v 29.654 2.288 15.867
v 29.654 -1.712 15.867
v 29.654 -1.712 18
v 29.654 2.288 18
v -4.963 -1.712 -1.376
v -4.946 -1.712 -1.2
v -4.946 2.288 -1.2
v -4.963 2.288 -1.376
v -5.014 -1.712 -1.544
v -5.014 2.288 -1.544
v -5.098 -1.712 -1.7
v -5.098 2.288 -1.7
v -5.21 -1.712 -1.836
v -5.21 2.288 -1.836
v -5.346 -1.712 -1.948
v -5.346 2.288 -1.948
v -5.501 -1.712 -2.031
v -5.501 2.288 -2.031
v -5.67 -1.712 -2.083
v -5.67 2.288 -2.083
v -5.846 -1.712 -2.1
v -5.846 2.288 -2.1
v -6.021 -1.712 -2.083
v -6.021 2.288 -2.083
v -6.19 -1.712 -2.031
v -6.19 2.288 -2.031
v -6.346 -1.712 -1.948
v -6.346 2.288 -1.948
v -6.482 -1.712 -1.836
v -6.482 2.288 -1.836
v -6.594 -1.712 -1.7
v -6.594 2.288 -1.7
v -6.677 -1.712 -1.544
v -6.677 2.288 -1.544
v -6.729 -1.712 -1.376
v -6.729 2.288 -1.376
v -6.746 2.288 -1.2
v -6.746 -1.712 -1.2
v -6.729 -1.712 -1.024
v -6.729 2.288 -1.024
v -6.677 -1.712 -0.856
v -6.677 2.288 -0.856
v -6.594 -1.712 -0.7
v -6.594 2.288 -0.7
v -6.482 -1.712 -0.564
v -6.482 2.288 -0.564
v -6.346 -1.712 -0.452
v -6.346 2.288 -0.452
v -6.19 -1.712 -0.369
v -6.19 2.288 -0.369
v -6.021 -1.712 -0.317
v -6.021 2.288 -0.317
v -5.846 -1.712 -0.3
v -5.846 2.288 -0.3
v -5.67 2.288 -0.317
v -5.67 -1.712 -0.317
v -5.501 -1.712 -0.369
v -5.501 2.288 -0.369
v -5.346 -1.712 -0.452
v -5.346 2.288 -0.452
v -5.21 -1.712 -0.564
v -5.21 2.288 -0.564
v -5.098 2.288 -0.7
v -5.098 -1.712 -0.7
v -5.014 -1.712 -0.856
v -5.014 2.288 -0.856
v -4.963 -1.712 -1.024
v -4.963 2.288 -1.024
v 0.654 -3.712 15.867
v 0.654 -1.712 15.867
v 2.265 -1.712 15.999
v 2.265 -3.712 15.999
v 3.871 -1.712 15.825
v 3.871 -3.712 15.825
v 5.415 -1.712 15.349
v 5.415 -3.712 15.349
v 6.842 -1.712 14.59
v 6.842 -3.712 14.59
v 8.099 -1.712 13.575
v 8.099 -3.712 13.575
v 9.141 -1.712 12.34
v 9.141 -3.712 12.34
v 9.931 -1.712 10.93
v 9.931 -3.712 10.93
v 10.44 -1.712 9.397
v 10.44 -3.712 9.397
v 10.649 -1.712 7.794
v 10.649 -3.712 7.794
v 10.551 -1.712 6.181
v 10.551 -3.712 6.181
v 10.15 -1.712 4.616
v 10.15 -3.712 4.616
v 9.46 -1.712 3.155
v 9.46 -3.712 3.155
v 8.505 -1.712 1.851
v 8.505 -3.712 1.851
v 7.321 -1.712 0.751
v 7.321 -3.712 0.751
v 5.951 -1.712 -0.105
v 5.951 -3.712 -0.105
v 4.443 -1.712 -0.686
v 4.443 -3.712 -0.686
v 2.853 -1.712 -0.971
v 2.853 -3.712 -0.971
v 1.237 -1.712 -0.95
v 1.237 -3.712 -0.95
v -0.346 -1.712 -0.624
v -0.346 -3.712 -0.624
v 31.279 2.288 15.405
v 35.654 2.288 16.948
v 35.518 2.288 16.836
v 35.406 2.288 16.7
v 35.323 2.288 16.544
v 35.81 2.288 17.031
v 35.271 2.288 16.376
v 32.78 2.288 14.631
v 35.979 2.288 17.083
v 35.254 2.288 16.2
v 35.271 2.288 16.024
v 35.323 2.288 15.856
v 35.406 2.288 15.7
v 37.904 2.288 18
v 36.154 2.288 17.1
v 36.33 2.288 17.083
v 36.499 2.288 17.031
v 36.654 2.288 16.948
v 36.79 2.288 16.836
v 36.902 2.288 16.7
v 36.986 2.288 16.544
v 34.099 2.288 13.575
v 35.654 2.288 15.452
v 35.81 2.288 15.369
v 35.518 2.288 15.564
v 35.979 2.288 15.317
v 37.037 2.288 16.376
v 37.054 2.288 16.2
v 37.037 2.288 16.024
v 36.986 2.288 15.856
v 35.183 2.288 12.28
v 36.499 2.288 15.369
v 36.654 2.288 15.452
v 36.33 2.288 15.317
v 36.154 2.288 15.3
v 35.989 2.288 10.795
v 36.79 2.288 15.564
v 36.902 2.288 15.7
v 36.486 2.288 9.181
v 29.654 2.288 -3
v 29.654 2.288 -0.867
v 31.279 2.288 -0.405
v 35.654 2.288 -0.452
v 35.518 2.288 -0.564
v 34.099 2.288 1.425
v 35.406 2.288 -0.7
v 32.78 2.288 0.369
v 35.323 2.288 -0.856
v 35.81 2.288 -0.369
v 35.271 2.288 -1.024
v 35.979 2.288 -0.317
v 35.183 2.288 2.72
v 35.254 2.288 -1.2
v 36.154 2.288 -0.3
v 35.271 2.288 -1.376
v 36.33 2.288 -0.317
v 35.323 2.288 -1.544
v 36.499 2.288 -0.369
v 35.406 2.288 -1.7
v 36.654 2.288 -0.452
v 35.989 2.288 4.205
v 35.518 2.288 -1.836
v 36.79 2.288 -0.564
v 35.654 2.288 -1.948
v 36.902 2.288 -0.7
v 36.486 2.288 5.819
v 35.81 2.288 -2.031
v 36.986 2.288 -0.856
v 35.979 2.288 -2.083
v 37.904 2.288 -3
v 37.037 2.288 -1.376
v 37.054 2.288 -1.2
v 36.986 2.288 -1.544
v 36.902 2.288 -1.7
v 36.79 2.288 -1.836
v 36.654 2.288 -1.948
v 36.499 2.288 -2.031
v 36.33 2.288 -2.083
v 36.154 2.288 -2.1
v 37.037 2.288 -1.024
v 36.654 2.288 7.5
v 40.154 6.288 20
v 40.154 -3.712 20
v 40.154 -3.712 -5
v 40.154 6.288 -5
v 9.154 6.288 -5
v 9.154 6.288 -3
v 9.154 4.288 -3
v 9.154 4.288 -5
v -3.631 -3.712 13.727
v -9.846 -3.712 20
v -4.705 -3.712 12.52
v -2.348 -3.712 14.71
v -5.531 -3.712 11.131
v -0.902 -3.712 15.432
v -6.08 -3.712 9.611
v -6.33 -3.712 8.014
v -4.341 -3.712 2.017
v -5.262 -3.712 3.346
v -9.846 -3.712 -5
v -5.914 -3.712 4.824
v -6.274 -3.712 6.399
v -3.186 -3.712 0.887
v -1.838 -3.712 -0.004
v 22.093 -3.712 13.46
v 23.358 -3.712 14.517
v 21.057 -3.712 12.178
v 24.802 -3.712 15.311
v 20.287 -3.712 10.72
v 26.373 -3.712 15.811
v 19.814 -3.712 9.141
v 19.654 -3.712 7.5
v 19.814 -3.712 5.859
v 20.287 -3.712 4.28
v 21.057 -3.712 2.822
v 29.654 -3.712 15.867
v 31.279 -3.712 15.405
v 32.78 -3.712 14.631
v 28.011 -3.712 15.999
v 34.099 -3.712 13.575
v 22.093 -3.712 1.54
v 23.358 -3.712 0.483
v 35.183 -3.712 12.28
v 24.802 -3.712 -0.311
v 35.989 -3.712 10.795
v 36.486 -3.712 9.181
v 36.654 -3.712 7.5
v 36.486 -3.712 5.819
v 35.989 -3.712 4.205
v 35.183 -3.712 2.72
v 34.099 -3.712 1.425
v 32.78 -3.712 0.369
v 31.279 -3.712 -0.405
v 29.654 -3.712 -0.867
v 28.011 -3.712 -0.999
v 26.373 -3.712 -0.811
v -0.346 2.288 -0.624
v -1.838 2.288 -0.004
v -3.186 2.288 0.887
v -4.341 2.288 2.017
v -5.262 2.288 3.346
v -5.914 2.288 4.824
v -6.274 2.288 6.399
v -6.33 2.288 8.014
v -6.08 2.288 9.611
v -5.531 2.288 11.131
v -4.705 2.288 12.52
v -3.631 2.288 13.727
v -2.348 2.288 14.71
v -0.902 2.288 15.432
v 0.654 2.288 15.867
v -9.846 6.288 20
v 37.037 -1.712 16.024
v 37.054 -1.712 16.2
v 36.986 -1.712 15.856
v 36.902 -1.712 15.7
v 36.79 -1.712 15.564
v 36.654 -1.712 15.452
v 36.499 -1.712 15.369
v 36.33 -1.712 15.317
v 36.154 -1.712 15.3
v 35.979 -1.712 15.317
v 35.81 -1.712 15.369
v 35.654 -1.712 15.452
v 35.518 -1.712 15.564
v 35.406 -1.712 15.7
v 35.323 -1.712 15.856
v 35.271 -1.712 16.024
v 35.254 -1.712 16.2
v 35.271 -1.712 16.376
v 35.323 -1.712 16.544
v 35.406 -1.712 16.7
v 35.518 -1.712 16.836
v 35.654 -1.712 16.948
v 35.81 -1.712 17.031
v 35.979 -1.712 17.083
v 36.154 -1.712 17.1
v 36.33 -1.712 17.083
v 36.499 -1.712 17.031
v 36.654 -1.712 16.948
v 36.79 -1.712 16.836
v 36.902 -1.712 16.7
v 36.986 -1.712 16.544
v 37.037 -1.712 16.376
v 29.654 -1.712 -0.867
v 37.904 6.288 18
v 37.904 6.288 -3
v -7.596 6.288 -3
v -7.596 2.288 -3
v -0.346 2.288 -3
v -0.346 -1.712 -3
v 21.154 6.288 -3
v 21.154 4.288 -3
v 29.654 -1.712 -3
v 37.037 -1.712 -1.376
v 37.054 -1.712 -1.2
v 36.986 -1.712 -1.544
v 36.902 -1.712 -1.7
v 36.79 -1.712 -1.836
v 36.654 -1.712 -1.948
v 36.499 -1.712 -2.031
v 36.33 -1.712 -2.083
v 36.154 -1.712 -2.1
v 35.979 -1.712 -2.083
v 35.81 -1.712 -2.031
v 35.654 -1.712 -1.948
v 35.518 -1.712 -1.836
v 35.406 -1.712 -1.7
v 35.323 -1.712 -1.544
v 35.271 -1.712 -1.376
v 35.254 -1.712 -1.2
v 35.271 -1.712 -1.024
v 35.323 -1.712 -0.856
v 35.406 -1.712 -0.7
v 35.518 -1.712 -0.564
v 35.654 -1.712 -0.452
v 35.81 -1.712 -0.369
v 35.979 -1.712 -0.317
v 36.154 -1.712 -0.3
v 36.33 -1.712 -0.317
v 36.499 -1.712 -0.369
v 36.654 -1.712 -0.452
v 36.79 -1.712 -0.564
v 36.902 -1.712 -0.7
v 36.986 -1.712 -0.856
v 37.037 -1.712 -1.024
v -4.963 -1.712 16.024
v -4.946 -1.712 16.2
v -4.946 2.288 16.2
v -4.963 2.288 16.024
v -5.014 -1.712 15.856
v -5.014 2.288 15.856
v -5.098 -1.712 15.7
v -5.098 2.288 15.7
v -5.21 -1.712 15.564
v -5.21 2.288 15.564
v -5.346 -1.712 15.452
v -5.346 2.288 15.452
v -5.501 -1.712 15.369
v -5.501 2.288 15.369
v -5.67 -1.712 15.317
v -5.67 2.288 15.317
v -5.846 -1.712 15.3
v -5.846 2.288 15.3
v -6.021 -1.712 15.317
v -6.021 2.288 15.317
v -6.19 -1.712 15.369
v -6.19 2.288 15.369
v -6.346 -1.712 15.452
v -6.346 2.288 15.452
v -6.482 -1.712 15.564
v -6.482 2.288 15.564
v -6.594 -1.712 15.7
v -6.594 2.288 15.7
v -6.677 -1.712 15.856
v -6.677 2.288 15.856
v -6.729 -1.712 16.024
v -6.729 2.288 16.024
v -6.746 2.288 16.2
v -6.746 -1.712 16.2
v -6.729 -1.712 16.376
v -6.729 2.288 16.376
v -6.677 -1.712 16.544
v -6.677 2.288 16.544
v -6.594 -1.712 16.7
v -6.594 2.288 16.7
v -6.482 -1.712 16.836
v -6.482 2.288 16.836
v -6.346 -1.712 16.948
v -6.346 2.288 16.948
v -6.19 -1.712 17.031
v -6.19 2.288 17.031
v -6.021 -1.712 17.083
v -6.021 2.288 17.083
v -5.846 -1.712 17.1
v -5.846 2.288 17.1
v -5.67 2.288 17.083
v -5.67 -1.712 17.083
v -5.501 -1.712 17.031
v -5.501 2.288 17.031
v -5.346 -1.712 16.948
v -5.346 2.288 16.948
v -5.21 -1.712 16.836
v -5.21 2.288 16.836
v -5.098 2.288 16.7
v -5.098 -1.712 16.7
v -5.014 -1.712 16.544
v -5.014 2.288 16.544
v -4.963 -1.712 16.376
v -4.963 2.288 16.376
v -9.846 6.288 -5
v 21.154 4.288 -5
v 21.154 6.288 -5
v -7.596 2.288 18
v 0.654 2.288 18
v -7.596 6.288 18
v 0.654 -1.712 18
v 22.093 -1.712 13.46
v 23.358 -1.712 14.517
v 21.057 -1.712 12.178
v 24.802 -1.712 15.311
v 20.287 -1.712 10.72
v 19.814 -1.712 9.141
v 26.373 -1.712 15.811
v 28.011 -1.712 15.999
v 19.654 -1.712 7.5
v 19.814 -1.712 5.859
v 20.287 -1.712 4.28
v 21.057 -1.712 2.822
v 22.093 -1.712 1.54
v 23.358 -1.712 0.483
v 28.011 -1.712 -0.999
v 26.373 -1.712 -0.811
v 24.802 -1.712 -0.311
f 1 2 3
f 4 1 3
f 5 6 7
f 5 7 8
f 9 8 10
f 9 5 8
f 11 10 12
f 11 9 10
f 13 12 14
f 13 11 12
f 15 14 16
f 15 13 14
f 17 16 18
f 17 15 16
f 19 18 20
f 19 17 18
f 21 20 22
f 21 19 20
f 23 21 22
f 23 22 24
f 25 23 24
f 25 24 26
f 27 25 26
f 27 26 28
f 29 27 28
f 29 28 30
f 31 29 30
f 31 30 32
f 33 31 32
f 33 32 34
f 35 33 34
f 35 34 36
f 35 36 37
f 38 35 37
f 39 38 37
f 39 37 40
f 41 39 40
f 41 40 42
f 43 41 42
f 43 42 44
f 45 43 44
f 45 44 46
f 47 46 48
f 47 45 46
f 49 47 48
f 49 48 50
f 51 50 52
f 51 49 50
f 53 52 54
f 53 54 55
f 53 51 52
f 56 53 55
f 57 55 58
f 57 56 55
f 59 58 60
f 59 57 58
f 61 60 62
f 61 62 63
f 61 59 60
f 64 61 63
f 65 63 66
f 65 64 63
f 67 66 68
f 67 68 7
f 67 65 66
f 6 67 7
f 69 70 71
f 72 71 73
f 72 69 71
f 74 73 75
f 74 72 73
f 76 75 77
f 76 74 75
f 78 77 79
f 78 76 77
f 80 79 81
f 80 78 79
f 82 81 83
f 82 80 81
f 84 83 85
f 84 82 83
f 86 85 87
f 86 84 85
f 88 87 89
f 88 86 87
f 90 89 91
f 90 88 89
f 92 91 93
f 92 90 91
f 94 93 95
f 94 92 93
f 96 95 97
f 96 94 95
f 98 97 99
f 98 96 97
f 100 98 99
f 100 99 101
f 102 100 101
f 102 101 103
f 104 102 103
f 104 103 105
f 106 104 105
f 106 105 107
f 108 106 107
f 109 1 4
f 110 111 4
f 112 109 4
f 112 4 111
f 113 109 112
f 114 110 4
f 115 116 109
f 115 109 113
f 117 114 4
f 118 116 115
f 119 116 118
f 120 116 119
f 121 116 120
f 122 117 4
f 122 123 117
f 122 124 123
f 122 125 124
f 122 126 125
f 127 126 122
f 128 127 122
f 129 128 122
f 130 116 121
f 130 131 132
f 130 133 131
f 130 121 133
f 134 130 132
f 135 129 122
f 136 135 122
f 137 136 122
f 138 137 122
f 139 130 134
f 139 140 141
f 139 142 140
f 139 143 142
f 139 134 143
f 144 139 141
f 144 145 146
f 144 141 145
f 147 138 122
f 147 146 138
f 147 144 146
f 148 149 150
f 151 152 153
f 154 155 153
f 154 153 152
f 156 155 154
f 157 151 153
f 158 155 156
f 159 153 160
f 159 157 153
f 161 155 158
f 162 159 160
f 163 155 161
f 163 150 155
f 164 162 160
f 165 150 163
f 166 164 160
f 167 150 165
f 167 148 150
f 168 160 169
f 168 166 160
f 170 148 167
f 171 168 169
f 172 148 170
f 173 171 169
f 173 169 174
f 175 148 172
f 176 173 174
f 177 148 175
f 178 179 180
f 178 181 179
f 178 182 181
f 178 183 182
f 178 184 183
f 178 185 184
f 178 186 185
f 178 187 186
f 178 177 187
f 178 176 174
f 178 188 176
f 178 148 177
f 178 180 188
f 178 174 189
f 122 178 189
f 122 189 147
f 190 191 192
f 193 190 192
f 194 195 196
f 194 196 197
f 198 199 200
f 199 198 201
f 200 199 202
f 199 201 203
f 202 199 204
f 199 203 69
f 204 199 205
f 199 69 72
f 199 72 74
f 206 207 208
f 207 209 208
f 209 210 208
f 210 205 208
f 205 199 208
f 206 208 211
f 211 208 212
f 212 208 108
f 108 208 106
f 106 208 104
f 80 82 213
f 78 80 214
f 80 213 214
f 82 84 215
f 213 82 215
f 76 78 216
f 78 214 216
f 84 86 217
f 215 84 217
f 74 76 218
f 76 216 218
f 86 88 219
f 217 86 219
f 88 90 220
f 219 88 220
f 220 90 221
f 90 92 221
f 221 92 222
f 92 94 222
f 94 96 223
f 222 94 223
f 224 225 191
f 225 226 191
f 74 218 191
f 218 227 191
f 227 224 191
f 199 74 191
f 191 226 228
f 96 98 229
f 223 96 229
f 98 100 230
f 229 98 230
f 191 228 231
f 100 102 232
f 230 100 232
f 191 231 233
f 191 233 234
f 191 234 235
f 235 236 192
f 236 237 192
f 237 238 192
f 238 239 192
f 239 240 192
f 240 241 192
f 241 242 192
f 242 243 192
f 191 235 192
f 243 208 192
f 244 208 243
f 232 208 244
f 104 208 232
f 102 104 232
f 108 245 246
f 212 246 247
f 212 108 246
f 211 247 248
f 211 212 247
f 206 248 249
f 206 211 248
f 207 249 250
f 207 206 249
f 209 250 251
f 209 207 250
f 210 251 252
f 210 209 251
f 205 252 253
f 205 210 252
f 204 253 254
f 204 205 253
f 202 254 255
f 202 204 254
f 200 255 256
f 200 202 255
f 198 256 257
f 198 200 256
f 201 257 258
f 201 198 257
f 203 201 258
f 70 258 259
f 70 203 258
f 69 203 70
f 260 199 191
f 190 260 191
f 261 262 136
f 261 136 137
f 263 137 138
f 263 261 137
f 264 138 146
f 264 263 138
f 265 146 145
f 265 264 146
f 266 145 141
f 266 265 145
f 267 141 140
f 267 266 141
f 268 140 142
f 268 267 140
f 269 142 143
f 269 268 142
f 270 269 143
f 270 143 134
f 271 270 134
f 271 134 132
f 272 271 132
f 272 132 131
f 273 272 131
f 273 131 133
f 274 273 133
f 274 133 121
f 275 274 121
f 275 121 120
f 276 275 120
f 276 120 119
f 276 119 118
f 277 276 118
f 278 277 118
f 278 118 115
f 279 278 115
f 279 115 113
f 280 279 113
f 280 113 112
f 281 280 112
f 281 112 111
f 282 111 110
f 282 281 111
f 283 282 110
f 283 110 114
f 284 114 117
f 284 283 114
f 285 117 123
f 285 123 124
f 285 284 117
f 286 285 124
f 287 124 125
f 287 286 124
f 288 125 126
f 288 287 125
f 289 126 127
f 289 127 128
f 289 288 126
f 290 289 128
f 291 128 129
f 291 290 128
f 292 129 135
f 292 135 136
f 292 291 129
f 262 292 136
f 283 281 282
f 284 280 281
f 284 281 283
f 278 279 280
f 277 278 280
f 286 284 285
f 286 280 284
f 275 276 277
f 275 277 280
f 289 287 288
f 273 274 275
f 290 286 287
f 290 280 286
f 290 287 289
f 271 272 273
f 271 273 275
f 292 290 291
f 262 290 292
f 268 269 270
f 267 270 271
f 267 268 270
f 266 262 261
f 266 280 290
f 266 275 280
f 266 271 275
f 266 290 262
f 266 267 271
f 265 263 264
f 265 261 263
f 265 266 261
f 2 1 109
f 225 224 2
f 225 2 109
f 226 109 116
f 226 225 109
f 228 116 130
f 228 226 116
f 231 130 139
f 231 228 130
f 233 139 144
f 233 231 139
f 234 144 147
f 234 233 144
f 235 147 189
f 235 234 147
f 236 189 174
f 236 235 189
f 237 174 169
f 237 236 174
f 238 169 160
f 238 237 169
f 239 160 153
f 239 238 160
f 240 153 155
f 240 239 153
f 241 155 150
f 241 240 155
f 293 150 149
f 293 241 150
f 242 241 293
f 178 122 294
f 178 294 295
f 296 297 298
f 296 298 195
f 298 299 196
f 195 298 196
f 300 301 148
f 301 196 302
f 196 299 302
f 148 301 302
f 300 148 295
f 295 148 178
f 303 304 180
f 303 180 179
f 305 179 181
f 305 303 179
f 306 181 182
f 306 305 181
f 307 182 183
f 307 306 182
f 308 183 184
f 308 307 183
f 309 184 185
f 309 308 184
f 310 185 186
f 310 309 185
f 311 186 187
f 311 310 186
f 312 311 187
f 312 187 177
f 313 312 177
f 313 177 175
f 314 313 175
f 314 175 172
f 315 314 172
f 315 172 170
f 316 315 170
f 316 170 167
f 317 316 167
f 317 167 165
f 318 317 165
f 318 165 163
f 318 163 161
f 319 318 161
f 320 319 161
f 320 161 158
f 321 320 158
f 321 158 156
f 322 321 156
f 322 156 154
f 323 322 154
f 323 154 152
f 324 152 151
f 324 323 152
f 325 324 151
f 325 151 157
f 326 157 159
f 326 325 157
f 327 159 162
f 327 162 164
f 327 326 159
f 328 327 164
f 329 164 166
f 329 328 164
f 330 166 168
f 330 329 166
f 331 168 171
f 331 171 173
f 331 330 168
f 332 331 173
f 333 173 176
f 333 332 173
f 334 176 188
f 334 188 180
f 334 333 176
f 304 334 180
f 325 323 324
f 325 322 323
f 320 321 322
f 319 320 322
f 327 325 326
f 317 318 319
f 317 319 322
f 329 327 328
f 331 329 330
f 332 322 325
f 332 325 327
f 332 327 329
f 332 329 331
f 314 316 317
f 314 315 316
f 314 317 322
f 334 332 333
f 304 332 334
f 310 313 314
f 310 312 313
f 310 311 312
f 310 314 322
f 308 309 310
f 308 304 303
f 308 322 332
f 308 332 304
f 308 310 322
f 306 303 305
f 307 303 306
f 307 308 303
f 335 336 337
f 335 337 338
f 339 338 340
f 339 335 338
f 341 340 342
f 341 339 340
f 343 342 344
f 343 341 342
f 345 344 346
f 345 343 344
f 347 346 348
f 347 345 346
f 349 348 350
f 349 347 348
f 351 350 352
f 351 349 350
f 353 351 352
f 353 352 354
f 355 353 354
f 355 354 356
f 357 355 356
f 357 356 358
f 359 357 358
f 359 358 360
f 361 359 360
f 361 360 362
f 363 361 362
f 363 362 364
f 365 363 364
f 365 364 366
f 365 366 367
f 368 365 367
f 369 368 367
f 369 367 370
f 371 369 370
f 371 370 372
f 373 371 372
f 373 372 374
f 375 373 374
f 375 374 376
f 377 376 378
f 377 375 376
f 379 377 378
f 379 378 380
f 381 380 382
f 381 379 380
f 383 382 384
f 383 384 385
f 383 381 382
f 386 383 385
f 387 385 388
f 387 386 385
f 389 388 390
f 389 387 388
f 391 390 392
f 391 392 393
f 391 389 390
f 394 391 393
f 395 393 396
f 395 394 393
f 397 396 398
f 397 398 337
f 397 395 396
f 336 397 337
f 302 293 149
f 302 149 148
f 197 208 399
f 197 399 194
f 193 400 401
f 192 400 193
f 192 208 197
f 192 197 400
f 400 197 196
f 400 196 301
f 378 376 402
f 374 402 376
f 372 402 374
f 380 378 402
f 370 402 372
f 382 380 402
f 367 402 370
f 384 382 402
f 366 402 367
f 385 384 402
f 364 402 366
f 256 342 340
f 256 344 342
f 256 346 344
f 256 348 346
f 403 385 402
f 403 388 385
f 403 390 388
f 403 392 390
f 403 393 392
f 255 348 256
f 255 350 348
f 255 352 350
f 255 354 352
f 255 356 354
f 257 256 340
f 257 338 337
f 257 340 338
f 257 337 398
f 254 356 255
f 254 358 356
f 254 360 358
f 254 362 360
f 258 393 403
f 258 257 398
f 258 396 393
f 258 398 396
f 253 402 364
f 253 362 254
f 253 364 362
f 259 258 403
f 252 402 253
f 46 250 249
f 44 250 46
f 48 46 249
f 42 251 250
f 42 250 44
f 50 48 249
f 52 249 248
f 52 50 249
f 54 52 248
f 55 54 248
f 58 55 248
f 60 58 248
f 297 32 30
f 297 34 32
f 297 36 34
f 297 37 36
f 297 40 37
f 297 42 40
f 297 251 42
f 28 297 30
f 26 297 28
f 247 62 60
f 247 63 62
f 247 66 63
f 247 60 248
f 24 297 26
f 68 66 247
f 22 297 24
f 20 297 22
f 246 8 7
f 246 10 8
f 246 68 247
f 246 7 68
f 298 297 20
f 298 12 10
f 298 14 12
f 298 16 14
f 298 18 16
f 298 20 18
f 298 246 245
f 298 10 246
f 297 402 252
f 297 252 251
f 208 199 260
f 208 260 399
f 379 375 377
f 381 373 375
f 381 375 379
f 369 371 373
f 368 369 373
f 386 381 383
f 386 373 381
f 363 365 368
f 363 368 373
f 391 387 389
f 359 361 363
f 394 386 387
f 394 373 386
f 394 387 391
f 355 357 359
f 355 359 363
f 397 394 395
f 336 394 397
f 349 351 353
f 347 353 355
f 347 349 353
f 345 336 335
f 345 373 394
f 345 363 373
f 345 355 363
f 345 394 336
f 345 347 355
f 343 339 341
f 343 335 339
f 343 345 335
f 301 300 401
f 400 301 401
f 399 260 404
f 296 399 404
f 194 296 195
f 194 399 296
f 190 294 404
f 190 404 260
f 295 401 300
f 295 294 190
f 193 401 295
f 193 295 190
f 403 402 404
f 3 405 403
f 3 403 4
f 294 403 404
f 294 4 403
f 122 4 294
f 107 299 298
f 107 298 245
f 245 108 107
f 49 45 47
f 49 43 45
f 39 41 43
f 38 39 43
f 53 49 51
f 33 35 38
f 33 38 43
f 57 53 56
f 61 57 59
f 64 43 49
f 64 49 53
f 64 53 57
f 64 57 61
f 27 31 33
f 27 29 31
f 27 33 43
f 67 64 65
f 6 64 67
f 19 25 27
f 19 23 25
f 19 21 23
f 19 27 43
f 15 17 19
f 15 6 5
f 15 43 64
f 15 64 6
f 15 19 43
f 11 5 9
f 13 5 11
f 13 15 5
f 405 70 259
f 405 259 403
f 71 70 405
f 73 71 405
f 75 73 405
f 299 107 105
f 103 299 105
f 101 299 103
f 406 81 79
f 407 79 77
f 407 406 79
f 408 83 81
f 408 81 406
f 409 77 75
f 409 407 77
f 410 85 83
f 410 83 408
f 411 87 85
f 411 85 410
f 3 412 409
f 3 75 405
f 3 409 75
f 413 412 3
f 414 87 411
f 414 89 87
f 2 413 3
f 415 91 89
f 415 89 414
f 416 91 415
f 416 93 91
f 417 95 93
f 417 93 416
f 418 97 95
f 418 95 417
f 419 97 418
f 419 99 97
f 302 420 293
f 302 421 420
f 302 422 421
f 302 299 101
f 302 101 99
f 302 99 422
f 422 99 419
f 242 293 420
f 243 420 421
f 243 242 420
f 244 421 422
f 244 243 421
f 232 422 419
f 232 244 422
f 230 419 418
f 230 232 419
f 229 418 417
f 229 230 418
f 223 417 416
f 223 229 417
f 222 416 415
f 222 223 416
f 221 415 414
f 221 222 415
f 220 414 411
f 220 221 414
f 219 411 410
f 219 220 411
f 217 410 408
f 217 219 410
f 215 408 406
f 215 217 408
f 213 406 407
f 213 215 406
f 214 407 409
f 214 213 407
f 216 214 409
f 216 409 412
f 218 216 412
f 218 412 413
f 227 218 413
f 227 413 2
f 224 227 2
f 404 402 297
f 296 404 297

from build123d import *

# Parameters (mm, degrees)
SKETCH004_W   = 50
SKETCH004_H   = 25
SKETCH004_W_2 = 45.5
SKETCH004_H_2 = 21
PAD001_DEPTH  = 10
SKETCH003_R   = 0.9
PAD002_DEPTH  = 6
SKETCH005_W   = 50
SKETCH005_H   = 25
SKETCH005_R   = 8.5
PAD003_DEPTH  = 2
SKETCH006_W   = 12
SKETCH006_H   = 2
POCKET_DEPTH  = 2


with BuildPart() as part:
    # Sketch004 (on DatumPlane) → Pad001 (new body)
    with BuildSketch(Plane(origin=(-8.845912, -3.712389, 7.5), x_dir=(1, 0, 0), z_dir=(0, 1, 0))):
        Rectangle(SKETCH004_W, SKETCH004_H)
        Rectangle(SKETCH004_W_2, SKETCH004_H_2, mode=Mode.SUBTRACT)
    extrude(amount=PAD001_DEPTH)

    # Sketch003 (on DatumPlane) → Pad002 (join)
    with BuildSketch(Plane(origin=(-8.845912, -3.712389, 7.5), x_dir=(1, 0, 0), z_dir=(0, 1, 0))):
        with BuildLine():
            Line((-23.5, -10.75), (-14.5, -10.75))
            Line((-14.5, -8.3666), (-14.5, -10.75))
            ThreePointArc((-15.5, 8.124038), (-21.484415, -0.514499), (-14.5, -8.3666))
            Line((-15.5, 10.75), (-15.5, 8.124038))
            Line((-15.5, 10.75), (-23.5, 10.75))
            Line((-23.5, 10.75), (-23.5, -10.75))
        make_face()
        with Locations((-21, 8.7)):
            Circle(SKETCH003_R, mode=Mode.SUBTRACT)
        with Locations((-21, -8.7)):
            Circle(SKETCH003_R, mode=Mode.SUBTRACT)
        with BuildLine():
            Line((23.5, -10.75), (23.5, 10.75))
            Line((23.5, 10.75), (14.5, 10.75))
            Line((14.5, 8.3666), (14.5, 10.75))
            ThreePointArc((14.5, -8.3666), (21.5, 0), (14.5, 8.3666))
            Line((14.5, -8.3666), (14.5, -10.75))
            Line((14.5, -10.75), (23.5, -10.75))
        make_face()
        with Locations((21, -8.7)):
            Circle(SKETCH003_R, mode=Mode.SUBTRACT)
        with Locations((21, 8.7)):
            Circle(SKETCH003_R, mode=Mode.SUBTRACT)
    extrude(amount=PAD002_DEPTH)

    # Sketch005 (on DatumPlane) → Pad003 (join)
    with BuildSketch(Plane(origin=(-8.845912, -3.712389, 7.5), x_dir=(1, 0, 0), z_dir=(0, 1, 0))):
        Rectangle(SKETCH005_W, SKETCH005_H)
        with Locations((-13, 0)):
            Circle(SKETCH005_R, mode=Mode.SUBTRACT)
        with Locations((13, 0)):
            Circle(SKETCH005_R, mode=Mode.SUBTRACT)
    extrude(amount=PAD003_DEPTH)

    # Sketch006 (on Face11 of Pad003) → Pocket (cut)
    with BuildSketch(Plane(origin=(-8.845912, 6.287611, 7.5), x_dir=(1, 0, 0), z_dir=(0, 1, 0))):
        with Locations((0, 11.5)):
            Rectangle(SKETCH006_W, SKETCH006_H)
    extrude(amount=-POCKET_DEPTH, mode=Mode.SUBTRACT)


with BuildPart() as part_1:
    # Body001 placement: moved
    add(part.part.moved(Location((24, 0, 0))))


solid = part_1.part
